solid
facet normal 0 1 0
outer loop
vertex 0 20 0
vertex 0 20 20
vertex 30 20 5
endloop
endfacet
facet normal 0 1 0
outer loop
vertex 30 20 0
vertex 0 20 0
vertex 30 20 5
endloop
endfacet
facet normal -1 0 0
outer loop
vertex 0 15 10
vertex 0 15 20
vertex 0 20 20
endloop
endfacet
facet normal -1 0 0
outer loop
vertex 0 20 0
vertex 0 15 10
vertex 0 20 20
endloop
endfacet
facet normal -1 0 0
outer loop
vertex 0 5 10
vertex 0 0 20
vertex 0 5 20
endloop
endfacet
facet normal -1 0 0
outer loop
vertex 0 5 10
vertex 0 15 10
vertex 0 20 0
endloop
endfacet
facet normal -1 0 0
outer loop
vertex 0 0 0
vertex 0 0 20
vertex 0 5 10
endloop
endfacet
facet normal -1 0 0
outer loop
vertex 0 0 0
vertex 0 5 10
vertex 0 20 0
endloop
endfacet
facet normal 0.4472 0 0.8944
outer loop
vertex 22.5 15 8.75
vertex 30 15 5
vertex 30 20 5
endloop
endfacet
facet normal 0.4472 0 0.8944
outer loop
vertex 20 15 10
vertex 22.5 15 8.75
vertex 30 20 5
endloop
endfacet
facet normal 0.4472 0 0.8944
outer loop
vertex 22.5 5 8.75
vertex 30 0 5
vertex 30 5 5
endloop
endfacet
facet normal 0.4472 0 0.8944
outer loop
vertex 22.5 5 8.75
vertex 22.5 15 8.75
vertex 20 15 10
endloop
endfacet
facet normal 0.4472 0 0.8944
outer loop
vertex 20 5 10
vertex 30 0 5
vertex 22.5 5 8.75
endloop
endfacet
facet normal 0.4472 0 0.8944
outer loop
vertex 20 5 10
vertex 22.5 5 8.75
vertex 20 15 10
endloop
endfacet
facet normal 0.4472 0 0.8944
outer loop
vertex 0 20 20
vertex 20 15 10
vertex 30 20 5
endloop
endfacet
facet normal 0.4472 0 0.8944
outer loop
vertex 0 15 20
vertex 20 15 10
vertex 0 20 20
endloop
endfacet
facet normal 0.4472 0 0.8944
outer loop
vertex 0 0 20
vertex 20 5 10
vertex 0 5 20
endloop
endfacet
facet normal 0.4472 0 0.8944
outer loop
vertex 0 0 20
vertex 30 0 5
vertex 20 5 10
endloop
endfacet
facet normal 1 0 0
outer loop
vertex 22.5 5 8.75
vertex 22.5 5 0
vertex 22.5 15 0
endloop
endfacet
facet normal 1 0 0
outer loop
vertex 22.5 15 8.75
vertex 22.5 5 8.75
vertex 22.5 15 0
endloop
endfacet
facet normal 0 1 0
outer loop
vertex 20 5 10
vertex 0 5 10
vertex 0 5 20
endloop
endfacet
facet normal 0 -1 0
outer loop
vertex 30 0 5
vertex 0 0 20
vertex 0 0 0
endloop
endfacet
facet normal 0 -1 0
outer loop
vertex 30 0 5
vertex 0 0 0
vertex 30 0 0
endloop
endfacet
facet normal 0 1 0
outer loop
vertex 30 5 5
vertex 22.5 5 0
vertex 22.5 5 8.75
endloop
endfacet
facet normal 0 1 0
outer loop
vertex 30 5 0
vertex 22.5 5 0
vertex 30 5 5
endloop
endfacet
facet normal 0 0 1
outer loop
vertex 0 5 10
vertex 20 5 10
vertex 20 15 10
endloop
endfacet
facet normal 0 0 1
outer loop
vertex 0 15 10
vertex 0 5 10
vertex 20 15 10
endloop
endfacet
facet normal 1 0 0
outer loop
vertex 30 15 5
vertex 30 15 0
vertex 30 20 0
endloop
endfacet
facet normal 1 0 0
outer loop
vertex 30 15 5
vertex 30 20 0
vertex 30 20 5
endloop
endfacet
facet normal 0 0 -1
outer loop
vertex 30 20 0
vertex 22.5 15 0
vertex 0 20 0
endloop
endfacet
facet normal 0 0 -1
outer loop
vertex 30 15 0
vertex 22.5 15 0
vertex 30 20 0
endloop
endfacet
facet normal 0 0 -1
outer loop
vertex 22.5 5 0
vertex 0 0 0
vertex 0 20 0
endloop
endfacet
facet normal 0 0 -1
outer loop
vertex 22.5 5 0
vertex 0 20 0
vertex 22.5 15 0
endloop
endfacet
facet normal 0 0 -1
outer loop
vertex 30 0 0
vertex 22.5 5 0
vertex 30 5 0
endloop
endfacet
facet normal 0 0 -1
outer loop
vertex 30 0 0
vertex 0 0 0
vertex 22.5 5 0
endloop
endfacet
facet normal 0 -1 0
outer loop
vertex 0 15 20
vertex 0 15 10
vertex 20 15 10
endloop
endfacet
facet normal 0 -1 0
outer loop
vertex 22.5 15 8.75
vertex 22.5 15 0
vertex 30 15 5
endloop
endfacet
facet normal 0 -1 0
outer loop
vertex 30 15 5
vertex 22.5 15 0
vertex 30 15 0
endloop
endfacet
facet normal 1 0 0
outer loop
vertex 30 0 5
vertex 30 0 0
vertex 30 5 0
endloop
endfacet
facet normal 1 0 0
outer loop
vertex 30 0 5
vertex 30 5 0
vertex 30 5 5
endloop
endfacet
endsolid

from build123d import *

# Parameters (mm, degrees)
F1_DEPTH = 20
F2_W     = 10
F2_H     = 10
F3_DEPTH = 25
F4_W     = 7.5
F4_H     = 10
F5_DEPTH = 25


with BuildPart() as f1:
    # F0 (on Front) → F1 (new body)
    with BuildSketch(Plane.XZ):
        Polygon((0, 20), (0, 0), (30, 0), (30, 5), align=None)
    extrude(amount=-F1_DEPTH)

    # F2 (on Right) → F3 (cut)
    with BuildSketch(Plane.YZ):
        with Locations((10, 15)):
            Rectangle(F2_W, F2_H)
    extrude(amount=F3_DEPTH, mode=Mode.SUBTRACT)

    # F4 (on Top) → F5 (cut)
    with BuildSketch(Plane.XY):
        with Locations((26.25, 10)):
            Rectangle(F4_W, F4_H)
    extrude(amount=F5_DEPTH, mode=Mode.SUBTRACT)


solid = f1.part
